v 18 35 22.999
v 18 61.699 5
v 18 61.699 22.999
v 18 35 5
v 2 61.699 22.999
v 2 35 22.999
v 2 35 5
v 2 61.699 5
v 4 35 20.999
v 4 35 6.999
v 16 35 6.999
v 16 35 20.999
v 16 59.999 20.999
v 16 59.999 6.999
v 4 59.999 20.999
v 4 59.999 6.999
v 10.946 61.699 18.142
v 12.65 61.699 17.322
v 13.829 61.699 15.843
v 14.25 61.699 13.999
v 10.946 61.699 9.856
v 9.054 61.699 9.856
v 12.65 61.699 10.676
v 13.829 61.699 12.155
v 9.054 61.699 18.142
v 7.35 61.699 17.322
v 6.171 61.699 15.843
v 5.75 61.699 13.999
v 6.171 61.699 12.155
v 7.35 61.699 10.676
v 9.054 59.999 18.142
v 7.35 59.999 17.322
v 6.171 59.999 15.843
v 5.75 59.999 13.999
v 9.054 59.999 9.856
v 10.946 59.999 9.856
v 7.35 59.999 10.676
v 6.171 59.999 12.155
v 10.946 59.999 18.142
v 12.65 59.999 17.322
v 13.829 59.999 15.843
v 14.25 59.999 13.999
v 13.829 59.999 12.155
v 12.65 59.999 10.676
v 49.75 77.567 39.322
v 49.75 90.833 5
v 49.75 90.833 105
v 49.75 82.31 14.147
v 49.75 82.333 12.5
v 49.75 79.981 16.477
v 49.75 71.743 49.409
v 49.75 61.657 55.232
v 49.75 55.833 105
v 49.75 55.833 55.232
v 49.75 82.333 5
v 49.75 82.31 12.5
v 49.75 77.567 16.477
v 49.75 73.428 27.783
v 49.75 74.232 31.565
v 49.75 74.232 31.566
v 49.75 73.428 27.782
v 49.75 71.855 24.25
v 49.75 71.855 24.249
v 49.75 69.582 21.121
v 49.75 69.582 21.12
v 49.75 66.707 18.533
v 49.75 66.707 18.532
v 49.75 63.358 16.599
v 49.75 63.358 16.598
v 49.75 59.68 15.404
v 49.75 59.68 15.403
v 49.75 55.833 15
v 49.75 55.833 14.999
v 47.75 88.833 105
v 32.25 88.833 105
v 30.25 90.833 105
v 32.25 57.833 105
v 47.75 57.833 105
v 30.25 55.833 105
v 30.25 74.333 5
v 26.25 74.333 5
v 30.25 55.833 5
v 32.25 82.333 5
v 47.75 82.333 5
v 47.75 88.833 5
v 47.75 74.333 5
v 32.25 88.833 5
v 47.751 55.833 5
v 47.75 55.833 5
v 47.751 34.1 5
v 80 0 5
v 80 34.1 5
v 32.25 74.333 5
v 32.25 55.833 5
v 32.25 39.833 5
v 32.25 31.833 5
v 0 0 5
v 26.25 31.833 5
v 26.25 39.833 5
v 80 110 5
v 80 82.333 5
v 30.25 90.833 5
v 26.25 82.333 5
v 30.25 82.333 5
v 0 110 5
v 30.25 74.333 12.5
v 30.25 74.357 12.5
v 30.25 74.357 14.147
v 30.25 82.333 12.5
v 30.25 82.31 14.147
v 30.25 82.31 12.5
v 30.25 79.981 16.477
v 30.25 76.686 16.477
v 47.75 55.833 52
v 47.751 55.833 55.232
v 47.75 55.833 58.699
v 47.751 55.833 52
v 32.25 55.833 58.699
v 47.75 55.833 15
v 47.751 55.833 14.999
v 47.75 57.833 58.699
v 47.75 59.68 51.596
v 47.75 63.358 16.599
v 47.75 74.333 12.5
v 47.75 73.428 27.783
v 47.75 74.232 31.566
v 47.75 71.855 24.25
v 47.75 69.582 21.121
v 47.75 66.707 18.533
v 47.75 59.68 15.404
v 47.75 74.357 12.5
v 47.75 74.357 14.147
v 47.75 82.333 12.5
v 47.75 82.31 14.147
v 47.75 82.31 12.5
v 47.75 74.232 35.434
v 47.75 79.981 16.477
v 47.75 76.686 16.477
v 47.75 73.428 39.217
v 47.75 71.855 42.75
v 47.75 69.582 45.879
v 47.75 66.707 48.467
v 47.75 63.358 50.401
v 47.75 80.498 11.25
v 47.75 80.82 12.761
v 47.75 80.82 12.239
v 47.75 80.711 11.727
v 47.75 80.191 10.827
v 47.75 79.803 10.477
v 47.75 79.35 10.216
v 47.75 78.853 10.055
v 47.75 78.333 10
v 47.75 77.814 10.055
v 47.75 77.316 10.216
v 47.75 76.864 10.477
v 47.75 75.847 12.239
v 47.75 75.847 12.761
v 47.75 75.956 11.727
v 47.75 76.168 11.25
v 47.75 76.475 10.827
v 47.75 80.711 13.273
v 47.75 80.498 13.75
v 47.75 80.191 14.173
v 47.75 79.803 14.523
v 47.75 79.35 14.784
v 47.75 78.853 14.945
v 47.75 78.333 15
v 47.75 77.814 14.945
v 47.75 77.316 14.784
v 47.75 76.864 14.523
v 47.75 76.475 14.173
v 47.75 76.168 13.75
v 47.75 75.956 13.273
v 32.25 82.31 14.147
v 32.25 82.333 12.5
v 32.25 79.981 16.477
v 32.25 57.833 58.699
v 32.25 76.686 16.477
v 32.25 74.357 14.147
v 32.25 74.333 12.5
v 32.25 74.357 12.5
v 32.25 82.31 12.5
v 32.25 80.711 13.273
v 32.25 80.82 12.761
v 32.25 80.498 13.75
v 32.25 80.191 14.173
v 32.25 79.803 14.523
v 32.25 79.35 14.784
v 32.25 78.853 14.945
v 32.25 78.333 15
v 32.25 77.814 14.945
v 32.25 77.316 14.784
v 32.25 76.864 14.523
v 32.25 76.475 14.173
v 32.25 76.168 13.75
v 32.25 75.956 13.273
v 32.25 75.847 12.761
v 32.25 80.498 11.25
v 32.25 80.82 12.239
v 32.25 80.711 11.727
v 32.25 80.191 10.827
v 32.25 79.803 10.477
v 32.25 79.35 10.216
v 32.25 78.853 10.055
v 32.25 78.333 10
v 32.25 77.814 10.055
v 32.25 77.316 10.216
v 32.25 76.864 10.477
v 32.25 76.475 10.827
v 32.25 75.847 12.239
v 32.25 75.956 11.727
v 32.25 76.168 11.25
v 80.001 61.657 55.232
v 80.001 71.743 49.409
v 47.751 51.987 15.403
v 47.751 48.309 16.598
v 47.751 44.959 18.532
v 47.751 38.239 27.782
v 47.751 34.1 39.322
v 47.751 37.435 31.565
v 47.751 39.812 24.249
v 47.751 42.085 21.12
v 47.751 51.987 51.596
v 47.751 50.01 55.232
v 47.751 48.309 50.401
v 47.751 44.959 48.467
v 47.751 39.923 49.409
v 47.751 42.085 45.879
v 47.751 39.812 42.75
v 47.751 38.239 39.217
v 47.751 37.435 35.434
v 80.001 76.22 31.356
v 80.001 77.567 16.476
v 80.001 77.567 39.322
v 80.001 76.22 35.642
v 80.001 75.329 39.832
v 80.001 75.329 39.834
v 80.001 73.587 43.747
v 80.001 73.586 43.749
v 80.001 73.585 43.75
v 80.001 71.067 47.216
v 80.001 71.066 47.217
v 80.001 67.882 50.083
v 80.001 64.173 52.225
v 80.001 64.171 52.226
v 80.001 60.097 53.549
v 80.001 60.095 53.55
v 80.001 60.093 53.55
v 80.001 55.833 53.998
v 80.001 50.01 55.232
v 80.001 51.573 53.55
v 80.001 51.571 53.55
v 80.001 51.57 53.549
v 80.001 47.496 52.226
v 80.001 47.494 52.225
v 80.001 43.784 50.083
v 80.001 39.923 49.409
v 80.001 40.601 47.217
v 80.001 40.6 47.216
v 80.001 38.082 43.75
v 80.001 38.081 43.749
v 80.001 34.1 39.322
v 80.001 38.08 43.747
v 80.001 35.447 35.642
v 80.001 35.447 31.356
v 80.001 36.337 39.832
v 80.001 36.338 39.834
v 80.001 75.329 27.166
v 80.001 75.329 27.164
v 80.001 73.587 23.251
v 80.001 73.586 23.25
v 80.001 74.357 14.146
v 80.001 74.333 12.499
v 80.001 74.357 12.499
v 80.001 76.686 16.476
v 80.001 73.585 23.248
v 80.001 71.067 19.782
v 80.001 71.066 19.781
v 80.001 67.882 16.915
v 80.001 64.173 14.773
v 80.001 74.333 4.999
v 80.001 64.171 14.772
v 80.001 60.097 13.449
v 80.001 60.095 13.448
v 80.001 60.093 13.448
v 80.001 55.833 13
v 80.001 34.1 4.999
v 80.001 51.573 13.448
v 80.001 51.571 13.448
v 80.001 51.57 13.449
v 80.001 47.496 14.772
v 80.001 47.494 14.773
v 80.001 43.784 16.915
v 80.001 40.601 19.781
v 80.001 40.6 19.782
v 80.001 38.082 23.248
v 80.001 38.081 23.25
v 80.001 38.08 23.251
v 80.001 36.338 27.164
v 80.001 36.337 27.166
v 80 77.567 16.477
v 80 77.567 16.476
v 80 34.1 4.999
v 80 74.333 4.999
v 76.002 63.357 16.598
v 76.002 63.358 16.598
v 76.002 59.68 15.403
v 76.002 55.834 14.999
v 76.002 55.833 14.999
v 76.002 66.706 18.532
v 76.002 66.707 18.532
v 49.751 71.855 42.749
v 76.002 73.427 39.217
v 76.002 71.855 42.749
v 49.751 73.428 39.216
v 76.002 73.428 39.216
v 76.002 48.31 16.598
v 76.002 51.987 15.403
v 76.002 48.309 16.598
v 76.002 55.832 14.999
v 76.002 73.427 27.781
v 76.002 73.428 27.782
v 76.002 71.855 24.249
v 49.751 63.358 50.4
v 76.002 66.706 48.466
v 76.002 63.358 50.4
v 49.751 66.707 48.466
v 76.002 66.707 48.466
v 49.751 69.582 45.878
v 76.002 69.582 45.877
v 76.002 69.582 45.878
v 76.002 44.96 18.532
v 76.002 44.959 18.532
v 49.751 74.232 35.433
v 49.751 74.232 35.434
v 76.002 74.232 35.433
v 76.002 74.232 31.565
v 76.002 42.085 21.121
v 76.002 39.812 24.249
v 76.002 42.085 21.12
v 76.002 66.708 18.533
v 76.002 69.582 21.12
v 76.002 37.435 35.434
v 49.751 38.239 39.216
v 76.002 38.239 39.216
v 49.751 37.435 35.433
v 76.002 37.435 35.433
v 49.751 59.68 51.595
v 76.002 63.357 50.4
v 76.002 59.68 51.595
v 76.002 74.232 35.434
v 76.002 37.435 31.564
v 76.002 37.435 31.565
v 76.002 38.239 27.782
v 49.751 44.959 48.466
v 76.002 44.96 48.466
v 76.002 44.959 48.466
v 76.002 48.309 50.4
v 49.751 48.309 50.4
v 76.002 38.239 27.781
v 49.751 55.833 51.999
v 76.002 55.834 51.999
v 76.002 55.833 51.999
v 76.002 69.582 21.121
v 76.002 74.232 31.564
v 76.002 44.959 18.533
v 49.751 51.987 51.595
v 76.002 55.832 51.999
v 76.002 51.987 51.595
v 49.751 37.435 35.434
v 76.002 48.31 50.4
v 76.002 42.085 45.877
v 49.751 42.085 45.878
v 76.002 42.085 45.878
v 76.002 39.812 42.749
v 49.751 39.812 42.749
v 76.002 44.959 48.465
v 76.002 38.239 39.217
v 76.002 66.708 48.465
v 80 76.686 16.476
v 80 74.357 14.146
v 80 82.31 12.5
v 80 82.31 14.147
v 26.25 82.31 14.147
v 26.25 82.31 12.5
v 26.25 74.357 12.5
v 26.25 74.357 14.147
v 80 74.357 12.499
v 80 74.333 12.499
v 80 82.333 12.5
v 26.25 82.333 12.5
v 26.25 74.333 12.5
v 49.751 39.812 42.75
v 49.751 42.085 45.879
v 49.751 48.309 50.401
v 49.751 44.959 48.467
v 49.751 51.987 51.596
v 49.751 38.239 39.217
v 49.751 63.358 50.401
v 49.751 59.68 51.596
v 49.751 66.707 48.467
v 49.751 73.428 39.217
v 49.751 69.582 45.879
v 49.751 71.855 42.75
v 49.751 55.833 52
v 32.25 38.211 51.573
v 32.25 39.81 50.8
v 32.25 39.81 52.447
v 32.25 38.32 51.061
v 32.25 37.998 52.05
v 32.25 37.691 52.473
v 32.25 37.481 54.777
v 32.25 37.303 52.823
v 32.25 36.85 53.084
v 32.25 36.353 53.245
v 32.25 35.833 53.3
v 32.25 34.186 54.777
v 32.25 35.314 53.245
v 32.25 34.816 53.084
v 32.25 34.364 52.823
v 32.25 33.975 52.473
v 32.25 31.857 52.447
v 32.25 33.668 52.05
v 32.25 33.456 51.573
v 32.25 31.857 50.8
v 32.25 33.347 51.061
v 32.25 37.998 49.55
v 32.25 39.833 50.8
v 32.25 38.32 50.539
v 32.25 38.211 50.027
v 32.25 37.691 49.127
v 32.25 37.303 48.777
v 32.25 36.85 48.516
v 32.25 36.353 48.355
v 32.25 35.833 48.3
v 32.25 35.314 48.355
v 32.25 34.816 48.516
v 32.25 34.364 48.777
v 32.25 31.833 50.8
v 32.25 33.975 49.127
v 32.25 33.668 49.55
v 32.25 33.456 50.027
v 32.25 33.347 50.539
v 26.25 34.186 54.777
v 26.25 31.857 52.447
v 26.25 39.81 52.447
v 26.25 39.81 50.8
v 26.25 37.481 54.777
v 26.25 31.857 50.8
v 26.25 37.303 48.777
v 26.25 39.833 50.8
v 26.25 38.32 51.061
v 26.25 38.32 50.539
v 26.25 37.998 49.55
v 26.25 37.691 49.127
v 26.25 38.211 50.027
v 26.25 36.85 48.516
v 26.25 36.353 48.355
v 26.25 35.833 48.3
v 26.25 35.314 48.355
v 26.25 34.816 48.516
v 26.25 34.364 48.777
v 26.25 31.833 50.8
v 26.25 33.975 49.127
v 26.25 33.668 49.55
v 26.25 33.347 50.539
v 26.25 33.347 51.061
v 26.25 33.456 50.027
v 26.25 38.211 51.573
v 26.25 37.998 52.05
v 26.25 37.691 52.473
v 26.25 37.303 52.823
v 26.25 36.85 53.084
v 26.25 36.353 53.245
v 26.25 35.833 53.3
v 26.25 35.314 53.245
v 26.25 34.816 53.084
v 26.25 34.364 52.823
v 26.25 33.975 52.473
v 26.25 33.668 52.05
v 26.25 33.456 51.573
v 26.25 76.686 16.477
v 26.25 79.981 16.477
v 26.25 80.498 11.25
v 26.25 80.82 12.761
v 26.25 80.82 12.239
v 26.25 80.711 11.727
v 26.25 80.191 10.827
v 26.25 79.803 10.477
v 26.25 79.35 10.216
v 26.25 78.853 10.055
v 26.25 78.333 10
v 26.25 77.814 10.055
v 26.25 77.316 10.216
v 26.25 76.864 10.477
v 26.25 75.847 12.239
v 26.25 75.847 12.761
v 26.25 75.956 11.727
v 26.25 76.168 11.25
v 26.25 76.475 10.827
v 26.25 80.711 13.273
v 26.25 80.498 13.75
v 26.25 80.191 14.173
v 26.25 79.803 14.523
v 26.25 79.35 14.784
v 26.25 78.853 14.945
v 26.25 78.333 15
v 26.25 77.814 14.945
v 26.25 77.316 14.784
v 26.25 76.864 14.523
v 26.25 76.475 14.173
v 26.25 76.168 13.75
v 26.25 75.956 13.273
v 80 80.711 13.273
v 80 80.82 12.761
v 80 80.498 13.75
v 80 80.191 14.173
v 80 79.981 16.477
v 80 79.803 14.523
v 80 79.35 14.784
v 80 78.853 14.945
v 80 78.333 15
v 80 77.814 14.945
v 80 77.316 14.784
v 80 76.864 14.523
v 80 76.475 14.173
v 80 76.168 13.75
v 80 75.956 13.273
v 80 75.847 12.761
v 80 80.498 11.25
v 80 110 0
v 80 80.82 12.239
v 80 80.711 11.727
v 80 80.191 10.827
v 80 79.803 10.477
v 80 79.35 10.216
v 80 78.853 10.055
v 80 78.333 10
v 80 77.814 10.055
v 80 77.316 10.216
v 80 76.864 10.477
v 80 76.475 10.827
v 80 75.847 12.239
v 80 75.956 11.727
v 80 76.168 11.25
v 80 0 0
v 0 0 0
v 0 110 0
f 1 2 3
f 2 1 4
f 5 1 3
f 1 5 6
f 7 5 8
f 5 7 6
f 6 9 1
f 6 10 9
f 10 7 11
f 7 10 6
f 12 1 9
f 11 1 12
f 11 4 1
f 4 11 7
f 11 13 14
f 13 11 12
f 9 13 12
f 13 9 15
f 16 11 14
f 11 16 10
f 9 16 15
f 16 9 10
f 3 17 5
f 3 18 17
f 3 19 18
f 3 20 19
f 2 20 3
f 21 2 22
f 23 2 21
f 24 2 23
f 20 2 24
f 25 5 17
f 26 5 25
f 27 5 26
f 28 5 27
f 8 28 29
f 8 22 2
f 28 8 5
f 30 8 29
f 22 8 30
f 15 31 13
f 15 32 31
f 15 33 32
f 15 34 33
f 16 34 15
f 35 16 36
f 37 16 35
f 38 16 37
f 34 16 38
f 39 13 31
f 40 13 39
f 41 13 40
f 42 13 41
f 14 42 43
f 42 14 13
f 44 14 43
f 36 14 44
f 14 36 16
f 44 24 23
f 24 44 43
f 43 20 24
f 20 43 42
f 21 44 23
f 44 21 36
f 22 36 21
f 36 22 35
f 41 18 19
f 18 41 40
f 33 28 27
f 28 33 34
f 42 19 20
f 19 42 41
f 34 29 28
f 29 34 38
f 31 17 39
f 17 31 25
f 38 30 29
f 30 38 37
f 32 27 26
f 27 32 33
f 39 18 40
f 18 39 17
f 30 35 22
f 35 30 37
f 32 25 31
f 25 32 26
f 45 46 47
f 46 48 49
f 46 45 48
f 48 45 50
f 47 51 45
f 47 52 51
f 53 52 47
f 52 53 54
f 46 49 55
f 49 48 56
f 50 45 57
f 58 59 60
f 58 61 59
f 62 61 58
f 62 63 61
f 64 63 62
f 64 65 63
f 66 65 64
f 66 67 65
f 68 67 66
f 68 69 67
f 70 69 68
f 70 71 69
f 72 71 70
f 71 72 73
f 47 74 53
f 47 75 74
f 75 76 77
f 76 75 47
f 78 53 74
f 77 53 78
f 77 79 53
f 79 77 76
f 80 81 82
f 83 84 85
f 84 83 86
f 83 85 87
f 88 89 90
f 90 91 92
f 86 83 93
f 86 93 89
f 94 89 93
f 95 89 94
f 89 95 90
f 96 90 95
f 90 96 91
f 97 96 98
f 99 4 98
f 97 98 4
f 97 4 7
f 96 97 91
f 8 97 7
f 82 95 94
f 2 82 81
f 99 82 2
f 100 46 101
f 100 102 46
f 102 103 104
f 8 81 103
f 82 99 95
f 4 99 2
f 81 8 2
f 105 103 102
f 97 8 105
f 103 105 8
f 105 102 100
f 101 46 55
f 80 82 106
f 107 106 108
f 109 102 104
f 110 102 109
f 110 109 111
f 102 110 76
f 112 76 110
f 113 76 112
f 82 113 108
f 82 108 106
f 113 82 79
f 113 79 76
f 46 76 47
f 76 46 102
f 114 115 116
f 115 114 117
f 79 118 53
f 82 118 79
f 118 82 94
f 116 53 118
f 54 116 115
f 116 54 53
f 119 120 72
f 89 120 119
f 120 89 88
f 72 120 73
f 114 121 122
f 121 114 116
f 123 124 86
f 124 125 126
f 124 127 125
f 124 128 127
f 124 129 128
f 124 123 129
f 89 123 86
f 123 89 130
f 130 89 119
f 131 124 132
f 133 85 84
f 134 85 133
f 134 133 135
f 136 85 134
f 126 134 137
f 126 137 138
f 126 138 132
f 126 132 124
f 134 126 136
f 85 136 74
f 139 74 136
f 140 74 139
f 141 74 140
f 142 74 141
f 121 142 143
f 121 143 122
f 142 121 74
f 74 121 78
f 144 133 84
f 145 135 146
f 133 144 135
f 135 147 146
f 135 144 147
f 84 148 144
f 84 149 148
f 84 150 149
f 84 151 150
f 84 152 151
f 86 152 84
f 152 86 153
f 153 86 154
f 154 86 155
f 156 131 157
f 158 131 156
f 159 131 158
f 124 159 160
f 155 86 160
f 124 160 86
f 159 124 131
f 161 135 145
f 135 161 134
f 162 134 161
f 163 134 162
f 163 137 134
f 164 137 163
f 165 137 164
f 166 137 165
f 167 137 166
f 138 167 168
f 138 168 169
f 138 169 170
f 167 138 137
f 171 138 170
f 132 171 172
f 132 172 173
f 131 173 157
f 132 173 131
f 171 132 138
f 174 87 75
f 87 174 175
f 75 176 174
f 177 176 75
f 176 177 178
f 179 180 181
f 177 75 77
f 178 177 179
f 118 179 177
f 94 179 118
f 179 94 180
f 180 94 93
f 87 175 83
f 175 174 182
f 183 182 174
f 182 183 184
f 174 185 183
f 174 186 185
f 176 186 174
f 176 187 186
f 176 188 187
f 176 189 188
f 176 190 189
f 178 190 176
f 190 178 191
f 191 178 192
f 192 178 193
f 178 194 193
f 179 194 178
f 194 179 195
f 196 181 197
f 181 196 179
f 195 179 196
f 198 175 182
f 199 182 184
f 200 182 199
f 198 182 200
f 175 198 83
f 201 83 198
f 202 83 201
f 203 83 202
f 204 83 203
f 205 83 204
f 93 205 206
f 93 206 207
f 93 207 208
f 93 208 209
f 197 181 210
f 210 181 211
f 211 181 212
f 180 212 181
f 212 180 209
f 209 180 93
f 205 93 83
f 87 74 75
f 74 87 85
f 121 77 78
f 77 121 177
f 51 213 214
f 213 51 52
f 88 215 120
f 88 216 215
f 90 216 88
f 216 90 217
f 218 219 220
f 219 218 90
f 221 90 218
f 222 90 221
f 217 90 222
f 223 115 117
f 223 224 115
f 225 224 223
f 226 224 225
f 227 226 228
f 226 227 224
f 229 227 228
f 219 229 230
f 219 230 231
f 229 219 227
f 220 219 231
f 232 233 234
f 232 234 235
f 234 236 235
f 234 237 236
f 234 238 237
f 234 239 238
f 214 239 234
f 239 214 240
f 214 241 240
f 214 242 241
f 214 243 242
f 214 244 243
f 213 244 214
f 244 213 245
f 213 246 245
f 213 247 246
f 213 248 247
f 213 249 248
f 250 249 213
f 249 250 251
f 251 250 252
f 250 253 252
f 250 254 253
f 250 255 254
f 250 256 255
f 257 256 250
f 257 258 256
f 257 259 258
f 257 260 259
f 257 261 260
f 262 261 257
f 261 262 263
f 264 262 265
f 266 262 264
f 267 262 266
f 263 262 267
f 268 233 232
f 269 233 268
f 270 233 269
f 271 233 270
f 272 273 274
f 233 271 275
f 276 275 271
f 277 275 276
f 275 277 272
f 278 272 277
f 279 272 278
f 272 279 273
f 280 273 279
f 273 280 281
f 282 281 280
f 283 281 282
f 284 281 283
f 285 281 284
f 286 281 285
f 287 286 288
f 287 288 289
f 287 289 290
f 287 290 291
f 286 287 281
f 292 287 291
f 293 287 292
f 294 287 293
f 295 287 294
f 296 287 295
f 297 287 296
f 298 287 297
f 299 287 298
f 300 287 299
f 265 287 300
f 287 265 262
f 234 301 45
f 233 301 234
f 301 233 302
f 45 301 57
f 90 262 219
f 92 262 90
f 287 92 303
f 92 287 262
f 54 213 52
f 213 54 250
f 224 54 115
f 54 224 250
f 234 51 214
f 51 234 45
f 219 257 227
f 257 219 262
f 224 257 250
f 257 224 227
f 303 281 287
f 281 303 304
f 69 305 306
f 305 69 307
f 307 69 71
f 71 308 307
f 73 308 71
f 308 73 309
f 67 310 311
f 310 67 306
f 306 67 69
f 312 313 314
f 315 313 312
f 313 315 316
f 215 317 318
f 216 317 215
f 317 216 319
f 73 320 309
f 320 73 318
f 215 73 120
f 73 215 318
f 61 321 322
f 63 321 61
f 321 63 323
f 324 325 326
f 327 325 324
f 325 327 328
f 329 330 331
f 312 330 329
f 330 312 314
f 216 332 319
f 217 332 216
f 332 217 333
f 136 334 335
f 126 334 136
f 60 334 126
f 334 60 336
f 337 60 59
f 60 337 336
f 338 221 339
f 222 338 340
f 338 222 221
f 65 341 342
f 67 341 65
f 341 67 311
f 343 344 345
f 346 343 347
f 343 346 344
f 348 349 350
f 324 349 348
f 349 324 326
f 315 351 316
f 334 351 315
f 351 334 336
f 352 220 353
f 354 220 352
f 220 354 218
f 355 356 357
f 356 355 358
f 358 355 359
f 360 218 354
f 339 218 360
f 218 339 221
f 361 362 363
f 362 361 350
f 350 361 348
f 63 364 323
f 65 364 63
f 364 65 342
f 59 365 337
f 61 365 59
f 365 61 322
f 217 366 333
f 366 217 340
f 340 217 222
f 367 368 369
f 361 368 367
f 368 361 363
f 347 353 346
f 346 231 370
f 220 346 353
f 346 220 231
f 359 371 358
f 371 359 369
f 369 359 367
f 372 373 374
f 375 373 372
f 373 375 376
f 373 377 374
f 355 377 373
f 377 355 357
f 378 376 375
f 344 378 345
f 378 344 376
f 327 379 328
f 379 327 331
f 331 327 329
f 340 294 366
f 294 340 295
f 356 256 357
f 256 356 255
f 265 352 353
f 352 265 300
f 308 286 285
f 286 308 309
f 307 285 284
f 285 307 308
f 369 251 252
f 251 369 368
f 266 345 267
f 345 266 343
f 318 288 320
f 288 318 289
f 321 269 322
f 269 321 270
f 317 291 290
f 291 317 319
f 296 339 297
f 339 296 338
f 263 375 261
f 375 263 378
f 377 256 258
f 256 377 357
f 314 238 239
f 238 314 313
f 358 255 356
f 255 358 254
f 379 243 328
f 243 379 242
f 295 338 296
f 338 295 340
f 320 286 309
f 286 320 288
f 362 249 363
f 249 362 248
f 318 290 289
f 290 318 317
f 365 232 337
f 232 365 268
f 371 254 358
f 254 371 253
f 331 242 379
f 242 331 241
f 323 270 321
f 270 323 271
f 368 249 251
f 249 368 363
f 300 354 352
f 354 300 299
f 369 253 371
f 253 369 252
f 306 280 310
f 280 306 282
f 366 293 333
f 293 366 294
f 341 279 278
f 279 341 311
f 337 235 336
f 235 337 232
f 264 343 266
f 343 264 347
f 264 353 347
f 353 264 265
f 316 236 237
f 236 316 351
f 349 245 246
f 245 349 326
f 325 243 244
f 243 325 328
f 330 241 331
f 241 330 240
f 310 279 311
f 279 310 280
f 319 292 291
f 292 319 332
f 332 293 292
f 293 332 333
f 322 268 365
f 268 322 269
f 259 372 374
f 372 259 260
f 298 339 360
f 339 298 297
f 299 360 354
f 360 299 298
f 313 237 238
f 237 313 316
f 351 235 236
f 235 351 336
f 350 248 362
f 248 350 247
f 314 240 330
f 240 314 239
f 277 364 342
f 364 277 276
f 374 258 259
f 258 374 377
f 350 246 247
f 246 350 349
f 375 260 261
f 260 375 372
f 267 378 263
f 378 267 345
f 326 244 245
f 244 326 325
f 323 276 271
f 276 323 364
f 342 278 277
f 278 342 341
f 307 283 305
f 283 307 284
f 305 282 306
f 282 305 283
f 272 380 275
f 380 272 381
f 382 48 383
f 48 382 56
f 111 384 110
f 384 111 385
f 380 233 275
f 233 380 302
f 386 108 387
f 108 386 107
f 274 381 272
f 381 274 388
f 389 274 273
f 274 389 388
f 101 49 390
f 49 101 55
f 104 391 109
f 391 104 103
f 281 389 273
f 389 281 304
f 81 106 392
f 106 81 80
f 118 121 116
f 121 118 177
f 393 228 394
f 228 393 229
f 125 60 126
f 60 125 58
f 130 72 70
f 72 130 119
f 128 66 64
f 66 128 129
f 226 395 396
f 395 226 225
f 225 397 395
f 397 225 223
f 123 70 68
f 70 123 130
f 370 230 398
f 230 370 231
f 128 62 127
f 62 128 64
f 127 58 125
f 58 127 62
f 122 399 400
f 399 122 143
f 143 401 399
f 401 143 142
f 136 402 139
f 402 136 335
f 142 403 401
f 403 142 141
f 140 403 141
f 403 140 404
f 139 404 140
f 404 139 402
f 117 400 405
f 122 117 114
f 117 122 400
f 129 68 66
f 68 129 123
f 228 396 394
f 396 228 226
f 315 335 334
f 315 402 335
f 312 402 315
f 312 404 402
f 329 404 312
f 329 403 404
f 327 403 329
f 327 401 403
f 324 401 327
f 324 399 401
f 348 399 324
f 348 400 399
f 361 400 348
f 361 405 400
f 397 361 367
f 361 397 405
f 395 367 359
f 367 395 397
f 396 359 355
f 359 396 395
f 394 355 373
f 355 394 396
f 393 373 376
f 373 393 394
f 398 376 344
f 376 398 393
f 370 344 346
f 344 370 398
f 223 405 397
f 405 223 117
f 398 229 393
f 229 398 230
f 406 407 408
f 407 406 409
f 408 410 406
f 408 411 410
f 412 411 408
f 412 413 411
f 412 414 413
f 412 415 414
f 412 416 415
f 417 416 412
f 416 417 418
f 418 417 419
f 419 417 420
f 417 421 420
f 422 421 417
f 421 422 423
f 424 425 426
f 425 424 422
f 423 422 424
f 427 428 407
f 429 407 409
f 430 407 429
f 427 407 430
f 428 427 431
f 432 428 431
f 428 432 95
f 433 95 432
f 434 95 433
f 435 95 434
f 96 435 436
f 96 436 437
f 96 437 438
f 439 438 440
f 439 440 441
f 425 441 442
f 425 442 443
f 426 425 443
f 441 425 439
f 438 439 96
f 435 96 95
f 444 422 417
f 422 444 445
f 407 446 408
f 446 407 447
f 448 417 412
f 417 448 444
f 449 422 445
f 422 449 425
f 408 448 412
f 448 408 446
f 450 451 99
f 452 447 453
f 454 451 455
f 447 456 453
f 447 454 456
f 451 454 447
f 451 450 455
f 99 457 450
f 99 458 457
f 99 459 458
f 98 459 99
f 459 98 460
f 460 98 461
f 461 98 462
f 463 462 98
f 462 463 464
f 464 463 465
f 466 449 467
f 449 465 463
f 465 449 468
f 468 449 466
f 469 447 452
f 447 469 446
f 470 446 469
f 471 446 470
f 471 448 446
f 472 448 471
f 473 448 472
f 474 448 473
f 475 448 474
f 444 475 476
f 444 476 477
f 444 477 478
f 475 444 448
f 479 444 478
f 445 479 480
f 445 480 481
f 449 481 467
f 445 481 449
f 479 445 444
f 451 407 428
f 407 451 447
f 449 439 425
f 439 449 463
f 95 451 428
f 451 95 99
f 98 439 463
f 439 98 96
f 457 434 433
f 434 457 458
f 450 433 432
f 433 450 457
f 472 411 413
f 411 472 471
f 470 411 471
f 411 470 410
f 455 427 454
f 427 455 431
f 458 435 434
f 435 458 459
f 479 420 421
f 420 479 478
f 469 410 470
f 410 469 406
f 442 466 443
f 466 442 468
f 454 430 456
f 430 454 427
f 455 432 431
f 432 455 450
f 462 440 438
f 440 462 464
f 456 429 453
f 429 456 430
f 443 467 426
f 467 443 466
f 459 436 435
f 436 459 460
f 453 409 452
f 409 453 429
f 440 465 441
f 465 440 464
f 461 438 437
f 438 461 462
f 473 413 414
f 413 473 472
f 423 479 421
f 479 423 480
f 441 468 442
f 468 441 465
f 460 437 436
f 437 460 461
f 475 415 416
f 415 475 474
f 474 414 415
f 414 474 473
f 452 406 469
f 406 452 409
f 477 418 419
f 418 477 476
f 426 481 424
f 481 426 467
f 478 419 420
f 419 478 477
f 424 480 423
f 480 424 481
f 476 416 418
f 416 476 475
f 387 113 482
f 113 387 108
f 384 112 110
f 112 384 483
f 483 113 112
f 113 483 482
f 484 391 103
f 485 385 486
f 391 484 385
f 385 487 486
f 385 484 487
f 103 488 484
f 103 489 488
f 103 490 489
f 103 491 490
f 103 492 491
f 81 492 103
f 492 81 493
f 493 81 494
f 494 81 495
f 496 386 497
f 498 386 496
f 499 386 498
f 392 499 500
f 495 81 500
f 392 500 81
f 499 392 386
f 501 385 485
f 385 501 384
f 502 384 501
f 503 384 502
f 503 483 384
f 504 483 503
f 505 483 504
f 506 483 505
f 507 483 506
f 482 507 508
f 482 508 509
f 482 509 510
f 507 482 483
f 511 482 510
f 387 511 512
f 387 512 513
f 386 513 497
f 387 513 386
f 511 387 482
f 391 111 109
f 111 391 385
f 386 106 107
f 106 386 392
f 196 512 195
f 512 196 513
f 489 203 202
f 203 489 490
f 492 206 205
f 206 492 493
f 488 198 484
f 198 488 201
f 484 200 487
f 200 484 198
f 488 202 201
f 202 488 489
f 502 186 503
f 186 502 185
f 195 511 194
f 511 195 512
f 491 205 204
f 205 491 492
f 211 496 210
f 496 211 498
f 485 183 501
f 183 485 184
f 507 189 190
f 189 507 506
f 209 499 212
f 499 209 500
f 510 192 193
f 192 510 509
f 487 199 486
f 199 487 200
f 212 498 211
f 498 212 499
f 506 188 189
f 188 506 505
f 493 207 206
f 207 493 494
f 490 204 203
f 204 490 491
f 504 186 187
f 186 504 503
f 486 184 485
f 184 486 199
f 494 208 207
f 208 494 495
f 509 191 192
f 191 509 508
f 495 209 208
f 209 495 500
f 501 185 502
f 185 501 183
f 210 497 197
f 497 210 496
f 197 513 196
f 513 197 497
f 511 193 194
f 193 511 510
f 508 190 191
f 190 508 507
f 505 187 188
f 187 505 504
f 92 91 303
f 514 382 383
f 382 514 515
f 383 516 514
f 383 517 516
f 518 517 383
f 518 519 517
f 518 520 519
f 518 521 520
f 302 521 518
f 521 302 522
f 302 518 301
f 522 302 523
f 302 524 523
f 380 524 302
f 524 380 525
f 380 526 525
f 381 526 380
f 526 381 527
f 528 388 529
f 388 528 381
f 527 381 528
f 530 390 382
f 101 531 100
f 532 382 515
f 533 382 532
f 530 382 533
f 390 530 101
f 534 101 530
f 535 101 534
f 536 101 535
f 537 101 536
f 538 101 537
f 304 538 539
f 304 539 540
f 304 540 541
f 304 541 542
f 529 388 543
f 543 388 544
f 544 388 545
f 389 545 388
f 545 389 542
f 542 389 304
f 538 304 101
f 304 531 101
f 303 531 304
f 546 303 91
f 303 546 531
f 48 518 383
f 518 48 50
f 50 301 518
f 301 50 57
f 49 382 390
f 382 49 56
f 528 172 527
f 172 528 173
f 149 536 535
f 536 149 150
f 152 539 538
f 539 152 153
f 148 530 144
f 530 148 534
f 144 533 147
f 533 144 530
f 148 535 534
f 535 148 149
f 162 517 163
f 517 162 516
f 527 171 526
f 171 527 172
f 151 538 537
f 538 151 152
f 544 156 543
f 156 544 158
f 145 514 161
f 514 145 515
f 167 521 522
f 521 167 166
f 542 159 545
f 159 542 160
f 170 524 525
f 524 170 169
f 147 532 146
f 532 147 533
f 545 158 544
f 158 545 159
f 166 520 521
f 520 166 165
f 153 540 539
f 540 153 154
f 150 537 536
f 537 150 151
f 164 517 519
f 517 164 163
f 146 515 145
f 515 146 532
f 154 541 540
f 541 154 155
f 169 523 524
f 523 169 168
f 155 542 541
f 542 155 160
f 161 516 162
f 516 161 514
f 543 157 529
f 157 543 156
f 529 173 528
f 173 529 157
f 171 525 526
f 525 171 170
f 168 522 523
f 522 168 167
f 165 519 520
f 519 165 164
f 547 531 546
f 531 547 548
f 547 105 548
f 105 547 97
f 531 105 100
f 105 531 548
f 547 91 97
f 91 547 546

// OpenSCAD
// file: hydration_bladder_dryer_common.scad
// Note: This drives the width of the opening and the tube and must 
// be big enough (e.g. actual + 0.5mm) to prevent an overly tight fit.
blowerPortWidth=15.5;

// This dictates the strength of the tower tube.  It will be printed
// in layers, so this must be thick enough to not be overly fragile.
towerWallThickness=2;

// Outer measurement for the long side of the tube tower on the base
tubeTowerLength=35;

// Outer measurement for the short side of the tube tower on the base
tubeTowerWidth=blowerPortWidth+(towerWallThickness*2);
// main file
include <hydration_bladder_dryer_common.scad>

overlap=0.001;

// Measurements of the blower fan
blowerWidth=53;
blowerHeight=51.2;
fanCenterY=24;
fanCenterZ=26;
fanCenterToMountHole1Y=20;
fanCenterToMountHole2Y=22.5;
fanCenterToMountHole1Z=17.3;
fanCenterToMountHole2Z=21;
fanDia=32;
mountHoleDia=5;

// This pops the top of the insertion 
// hole up a bit so the blower will slide in.
blowerInsertionClearance=2.5;

// COMMON blowerPortWidth=15.5;
blowerPortLength=20;
// COMMON towerWallThickness=2;
intakeWallThickness=4;
intakeSupportHeight=6;

blowerFanCenterToPortCenter=17;

baseWidth=80;
baseLength=110;
baseHeight=5;

// COMMON tubeTowerWidth=blowerPortWidth+(towerWallThickness*2);
// outer dimension of the long side of the tube.
// COMMON tubeTowerLength=35;

tubeTowerBlowerPartHeight=100;

tubeTowerX = (baseWidth/2) - (tubeTowerWidth / 2);
tubeTowerY = (baseLength/3*2) - (tubeTowerLength / 2);

intakeOuterDia=45;
intakeOuterLength=(baseWidth/2) - (tubeTowerWidth/2) + towerWallThickness;
intakeInnerDia=intakeOuterDia-(2 * intakeWallThickness);

intakeAssemblyCenterY=0;  // during assembly the intake is centered on axis
intakeAssemblyCenterZ=intakeSupportHeight + intakeOuterDia/2;

mountPostWidth = 8;
mountPostThickness = 6;
mountPostHoleDia = 5;

// Note: Posts start centered on x-axis, 
//    so y positions apply to the center of the mounting hole
mountPost1Height = intakeAssemblyCenterZ + fanCenterToMountHole1Z;
// Note: post starts centered at X=0
mountPost1X = -(mountPostThickness/2 - towerWallThickness);
mountPost1Y = intakeAssemblyCenterY-fanCenterToMountHole1Y;
mountPost2Height = intakeAssemblyCenterZ-fanCenterToMountHole2Z;
mountPost2X = mountPost1X;
mountPost2Y = intakeAssemblyCenterY+fanCenterToMountHole2Y;

mountHole1Y=intakeAssemblyCenterY-mountPost1Y;
mountHole1Z=10;

mountHole2Y=10;
mountHole2Z=10;


// x position inside the wide side of the tube
// y position right side of the blower inside the narrow side of the tube

// TODO: Figure out how to actually calculate blowerZOffsetFromBase
blowerZOffsetFromBase=2.5;

*translate([tubeTowerX+towerWallThickness, 
        tubeTowerY+intakeAssemblyCenterY-fanCenterY,
        baseHeight+blowerZOffsetFromBase]) {
    blowerPlaceHolder();
}

// base
difference() {
    union() {
        cube([baseWidth, baseLength, baseHeight]);
        translate([2,35,baseHeight-overlap]) {
            rotate([0,0,0]) {
                powerJackMount();
            }
        }

        // Tower tube
        translate([tubeTowerX, tubeTowerY ,baseHeight]) {
            // All of these things are positioned at z=0
            union() {
                difference() {
                    union() {
                        difference() {
                            cube([tubeTowerWidth, 
                                tubeTowerLength, 
                                tubeTowerBlowerPartHeight]);
                            translate([towerWallThickness, 
                                    towerWallThickness, -overlap]) {
                                cube([tubeTowerWidth-2*towerWallThickness, 
                                    tubeTowerLength-2*towerWallThickness, 
                                    tubeTowerBlowerPartHeight + overlap*2]);
                            }
                        }
                        // intake
                        translate([tubeTowerWidth-towerWallThickness+overlap,
                                0,
                                -overlap]) {
                            intake();
                        }
                        
                    }
                    // blower opening
                    translate([towerWallThickness,-overlap,-overlap]) {
                        cube([tubeTowerWidth-towerWallThickness*2,
                            towerWallThickness + overlap*2, 
                                blowerHeight+blowerInsertionClearance]);
                    }
                    // cutout for intake
                    translate([(tubeTowerWidth-towerWallThickness)-overlap, 
                            0, intakeOuterDia/2+intakeSupportHeight]) {
                        rotate([0,90,0]) {
                            cylinder(d=intakeInnerDia, h=towerWallThickness+overlap*2);
                        }
                    }
                    // cutout for mount post 2 and 2b 
                    // (goes all the way through edge of intake)
                    translate([mountPost2X, mountPost2Y, -overlap]) {
                        scale([50,1,1]) {
                            mountPost(mountPostWidth, mountPostThickness, 
                                mountPost2Height, 0);
                        }
                    }

                }
                // Mount Post 1
                translate([mountPost1X, mountPost1Y, 0]) {
                    mountPost(mountPostWidth, mountPostThickness, 
                        mountPost1Height, mountPostHoleDia);
                }

                // Mount Post 2
                translate([mountPost2X, mountPost2Y, 0]) {
                    mountPost(mountPostWidth, mountPostThickness, 
                        mountPost2Height, mountPostHoleDia);
                }
                
                // Mount Post 2b  (through the edge of the intake.
                translate([mountPost2X+(tubeTowerWidth-
                       (towerWallThickness/2))+ intakeOuterLength/2, mountPost2Y, 0]) {
                    mountPost(mountPostWidth, intakeOuterLength, 
                        mountPost2Height, mountPostHoleDia);
                }
            }
        }
    }
    *trialPrintReductionCuts();
}
// ------------------------------------------------------------------
//
//      Modules
//
// ------------------------------------------------------------------
module powerJackMount() {
    powerJackMountBoxThickness=2;
    powerJackMountSurfaceThickness=1.7;
    powerJackMountBoxInnerHeight=14;
    powerJackMountBoxInnerWidth=12;
    powerJackMountBoxLength=25;
    powerJackMountHoleDia=8.5;
    union() {
        difference() {
            cube([powerJackMountBoxInnerWidth+powerJackMountBoxThickness*2,
                powerJackMountBoxLength,
                powerJackMountBoxInnerHeight+powerJackMountBoxThickness*2]);
            translate([powerJackMountBoxThickness,
                    -overlap,
                    powerJackMountBoxThickness]) {
                cube([powerJackMountBoxInnerWidth,
                    powerJackMountBoxLength+overlap*2,
                    powerJackMountBoxInnerHeight]);
            }
        }
        translate([0,powerJackMountBoxLength-overlap,0]) {
            difference() {
                cube([powerJackMountBoxInnerWidth+powerJackMountBoxThickness*2,
                        powerJackMountSurfaceThickness,
                        powerJackMountBoxInnerHeight+powerJackMountBoxThickness*2]);
                translate([(powerJackMountBoxInnerWidth+powerJackMountBoxThickness*2)/2,
                        -overlap,
                        (powerJackMountBoxInnerHeight+powerJackMountBoxThickness*2)/2]) {
                    rotate([-90,0,0]) {
                        cylinder(d=powerJackMountHoleDia, 
                                h=powerJackMountSurfaceThickness+overlap*2);
                    }
                }
            }
        }
    }
} 

module intake() {
    translate([0,0,intakeOuterDia/2 + intakeSupportHeight]) {
        rotate([0, 90, 0]) {
            difference() {
                union() {
                    // Note: multiplier on diameter and $fn work together
                    // here to make the outer surface coarsly faceted.
                    // The purpose is both style, and to be 3D printer friendly
                    intakeOuterSides=12;
                    // Rotation puts flat sides across top and on left and right
                    rotate([0,0,180/intakeOuterSides]) {
                        cylinder(d=intakeOuterDia, h=intakeOuterLength, 
                            $fn=intakeOuterSides);
                    }
                    // Intake Support
                    // Note: Since the outer "cylinder" is made into a polygon
                    // by setting a small number of sides, the actual width
                    // of the base should be the apothem (low/flat-side) radius
                    // The forumla for the apothem, given the radius (r) and
                    // number of sides (n) is:  apothem = r cos (180/n)
                    // So, to make the base and cyl match up exactly...
                    flatSideRadius = intakeOuterDia/2 
                        * cos(180/intakeOuterSides);
                    
                    translate([intakeOuterDia/4 + intakeSupportHeight/2,
                                   0, intakeOuterLength/2]) {
                        cube([intakeOuterDia/2+intakeSupportHeight, 
                            flatSideRadius*2, intakeOuterLength],center=true);
                    }
                }
                // hole for air to pass through
                translate([0,0,-overlap]) {
                    cylinder(d=intakeInnerDia, h=intakeOuterLength+overlap*2);
                }
                // camfer leading edge of intake
                translate([0,0,intakeOuterLength-intakeWallThickness]) {
                    cylinder(d1=intakeInnerDia-overlap, 
                        d2=intakeOuterDia-intakeWallThickness, 
                    h=intakeWallThickness+overlap*2);
                }
            }
        }
    }
}

// blower place holder
module blowerPlaceHolder() {
    difference() {
        color([1,0,0]) cube([blowerPortWidth,blowerWidth,blowerHeight]);
        translate([-1, fanCenterY, fanCenterZ]) 
            rotate([0,90,0]) cylinder(d=fanDia, h=17, $fn=20);
        // mount-hole upper-left
        translate([-1, fanCenterY-fanCenterToMountHole1Y, 
                fanCenterZ+fanCenterToMountHole1Z]) 
            rotate([0,90,0]) cylinder(d=mountHoleDia, h=17, $fn=20);
        // mount-hole lower-right
        translate([-1, fanCenterY+fanCenterToMountHole2Y, 
                fanCenterZ-fanCenterToMountHole2Z]) 
            rotate([0,90,0]) cylinder(d=mountHoleDia, h=17, $fn=20);
    }
}

// mount_post - Creates a post with a hole in the top
// * Hole size is relative to the width of the post
// * argMountPostHeight positions the center of the hole
// * returned object is centered at [0,0] and bottom is at z=0
module mountPost(argMountPostWidth, argMountPostThickness, 
        argMountPostHeight, argMountHoleDia) {
    difference() {
        union() {
            // domed top
            domedTopSides=8;
            // The difference between this and the actual radius must
            // be added to the radius of the outer cylinder
            flatSideRadius = argMountPostWidth/2 
                * cos(180/domedTopSides);
            facetedCylinderShrinkAmount = argMountPostWidth-flatSideRadius*2;
            translate([-argMountPostThickness/2, 0, argMountPostHeight]) {
                rotate([0, 90, 0]) {
                    rotate([0,0,180/domedTopSides]) {
                        cylinder(d=(argMountPostWidth + facetedCylinderShrinkAmount), 
                            h=argMountPostThickness, 
                            $fn=domedTopSides);
                    }
                }
            }
            // column
            translate([-argMountPostThickness/2, -argMountPostWidth/2, 0]) {
                cube([argMountPostThickness, argMountPostWidth, 
                    argMountPostHeight]);
            }
        }
        translate([-argMountPostThickness/2-overlap, 0, argMountPostHeight]) {
            rotate([0, 90, 0]) {
                cylinder(d=argMountHoleDia, 
                    h=argMountPostThickness+(overlap*2), $fn=30);
            }
        }
    }
};

module trialPrintReductionCuts() {
    translate([55,30,20]) cube([500,500,500]); // cut bulk of intake
    translate([0,0,63]) cube([500,500,500]); // cut top
    translate([-1,-1,-1]) cube([500,500,4]); // trim base 1
    translate([-1,-1,-1]) cube([20,500,500]); // trim base 2
    translate([-1,-1,-1]) cube([500,30,500]); // trim base 3
    translate([-1,95,-1]) cube([500,500,500]); // trim base 4
    translate([60,-1,-1]) cube([500,500,500]); // trim base 5
}
